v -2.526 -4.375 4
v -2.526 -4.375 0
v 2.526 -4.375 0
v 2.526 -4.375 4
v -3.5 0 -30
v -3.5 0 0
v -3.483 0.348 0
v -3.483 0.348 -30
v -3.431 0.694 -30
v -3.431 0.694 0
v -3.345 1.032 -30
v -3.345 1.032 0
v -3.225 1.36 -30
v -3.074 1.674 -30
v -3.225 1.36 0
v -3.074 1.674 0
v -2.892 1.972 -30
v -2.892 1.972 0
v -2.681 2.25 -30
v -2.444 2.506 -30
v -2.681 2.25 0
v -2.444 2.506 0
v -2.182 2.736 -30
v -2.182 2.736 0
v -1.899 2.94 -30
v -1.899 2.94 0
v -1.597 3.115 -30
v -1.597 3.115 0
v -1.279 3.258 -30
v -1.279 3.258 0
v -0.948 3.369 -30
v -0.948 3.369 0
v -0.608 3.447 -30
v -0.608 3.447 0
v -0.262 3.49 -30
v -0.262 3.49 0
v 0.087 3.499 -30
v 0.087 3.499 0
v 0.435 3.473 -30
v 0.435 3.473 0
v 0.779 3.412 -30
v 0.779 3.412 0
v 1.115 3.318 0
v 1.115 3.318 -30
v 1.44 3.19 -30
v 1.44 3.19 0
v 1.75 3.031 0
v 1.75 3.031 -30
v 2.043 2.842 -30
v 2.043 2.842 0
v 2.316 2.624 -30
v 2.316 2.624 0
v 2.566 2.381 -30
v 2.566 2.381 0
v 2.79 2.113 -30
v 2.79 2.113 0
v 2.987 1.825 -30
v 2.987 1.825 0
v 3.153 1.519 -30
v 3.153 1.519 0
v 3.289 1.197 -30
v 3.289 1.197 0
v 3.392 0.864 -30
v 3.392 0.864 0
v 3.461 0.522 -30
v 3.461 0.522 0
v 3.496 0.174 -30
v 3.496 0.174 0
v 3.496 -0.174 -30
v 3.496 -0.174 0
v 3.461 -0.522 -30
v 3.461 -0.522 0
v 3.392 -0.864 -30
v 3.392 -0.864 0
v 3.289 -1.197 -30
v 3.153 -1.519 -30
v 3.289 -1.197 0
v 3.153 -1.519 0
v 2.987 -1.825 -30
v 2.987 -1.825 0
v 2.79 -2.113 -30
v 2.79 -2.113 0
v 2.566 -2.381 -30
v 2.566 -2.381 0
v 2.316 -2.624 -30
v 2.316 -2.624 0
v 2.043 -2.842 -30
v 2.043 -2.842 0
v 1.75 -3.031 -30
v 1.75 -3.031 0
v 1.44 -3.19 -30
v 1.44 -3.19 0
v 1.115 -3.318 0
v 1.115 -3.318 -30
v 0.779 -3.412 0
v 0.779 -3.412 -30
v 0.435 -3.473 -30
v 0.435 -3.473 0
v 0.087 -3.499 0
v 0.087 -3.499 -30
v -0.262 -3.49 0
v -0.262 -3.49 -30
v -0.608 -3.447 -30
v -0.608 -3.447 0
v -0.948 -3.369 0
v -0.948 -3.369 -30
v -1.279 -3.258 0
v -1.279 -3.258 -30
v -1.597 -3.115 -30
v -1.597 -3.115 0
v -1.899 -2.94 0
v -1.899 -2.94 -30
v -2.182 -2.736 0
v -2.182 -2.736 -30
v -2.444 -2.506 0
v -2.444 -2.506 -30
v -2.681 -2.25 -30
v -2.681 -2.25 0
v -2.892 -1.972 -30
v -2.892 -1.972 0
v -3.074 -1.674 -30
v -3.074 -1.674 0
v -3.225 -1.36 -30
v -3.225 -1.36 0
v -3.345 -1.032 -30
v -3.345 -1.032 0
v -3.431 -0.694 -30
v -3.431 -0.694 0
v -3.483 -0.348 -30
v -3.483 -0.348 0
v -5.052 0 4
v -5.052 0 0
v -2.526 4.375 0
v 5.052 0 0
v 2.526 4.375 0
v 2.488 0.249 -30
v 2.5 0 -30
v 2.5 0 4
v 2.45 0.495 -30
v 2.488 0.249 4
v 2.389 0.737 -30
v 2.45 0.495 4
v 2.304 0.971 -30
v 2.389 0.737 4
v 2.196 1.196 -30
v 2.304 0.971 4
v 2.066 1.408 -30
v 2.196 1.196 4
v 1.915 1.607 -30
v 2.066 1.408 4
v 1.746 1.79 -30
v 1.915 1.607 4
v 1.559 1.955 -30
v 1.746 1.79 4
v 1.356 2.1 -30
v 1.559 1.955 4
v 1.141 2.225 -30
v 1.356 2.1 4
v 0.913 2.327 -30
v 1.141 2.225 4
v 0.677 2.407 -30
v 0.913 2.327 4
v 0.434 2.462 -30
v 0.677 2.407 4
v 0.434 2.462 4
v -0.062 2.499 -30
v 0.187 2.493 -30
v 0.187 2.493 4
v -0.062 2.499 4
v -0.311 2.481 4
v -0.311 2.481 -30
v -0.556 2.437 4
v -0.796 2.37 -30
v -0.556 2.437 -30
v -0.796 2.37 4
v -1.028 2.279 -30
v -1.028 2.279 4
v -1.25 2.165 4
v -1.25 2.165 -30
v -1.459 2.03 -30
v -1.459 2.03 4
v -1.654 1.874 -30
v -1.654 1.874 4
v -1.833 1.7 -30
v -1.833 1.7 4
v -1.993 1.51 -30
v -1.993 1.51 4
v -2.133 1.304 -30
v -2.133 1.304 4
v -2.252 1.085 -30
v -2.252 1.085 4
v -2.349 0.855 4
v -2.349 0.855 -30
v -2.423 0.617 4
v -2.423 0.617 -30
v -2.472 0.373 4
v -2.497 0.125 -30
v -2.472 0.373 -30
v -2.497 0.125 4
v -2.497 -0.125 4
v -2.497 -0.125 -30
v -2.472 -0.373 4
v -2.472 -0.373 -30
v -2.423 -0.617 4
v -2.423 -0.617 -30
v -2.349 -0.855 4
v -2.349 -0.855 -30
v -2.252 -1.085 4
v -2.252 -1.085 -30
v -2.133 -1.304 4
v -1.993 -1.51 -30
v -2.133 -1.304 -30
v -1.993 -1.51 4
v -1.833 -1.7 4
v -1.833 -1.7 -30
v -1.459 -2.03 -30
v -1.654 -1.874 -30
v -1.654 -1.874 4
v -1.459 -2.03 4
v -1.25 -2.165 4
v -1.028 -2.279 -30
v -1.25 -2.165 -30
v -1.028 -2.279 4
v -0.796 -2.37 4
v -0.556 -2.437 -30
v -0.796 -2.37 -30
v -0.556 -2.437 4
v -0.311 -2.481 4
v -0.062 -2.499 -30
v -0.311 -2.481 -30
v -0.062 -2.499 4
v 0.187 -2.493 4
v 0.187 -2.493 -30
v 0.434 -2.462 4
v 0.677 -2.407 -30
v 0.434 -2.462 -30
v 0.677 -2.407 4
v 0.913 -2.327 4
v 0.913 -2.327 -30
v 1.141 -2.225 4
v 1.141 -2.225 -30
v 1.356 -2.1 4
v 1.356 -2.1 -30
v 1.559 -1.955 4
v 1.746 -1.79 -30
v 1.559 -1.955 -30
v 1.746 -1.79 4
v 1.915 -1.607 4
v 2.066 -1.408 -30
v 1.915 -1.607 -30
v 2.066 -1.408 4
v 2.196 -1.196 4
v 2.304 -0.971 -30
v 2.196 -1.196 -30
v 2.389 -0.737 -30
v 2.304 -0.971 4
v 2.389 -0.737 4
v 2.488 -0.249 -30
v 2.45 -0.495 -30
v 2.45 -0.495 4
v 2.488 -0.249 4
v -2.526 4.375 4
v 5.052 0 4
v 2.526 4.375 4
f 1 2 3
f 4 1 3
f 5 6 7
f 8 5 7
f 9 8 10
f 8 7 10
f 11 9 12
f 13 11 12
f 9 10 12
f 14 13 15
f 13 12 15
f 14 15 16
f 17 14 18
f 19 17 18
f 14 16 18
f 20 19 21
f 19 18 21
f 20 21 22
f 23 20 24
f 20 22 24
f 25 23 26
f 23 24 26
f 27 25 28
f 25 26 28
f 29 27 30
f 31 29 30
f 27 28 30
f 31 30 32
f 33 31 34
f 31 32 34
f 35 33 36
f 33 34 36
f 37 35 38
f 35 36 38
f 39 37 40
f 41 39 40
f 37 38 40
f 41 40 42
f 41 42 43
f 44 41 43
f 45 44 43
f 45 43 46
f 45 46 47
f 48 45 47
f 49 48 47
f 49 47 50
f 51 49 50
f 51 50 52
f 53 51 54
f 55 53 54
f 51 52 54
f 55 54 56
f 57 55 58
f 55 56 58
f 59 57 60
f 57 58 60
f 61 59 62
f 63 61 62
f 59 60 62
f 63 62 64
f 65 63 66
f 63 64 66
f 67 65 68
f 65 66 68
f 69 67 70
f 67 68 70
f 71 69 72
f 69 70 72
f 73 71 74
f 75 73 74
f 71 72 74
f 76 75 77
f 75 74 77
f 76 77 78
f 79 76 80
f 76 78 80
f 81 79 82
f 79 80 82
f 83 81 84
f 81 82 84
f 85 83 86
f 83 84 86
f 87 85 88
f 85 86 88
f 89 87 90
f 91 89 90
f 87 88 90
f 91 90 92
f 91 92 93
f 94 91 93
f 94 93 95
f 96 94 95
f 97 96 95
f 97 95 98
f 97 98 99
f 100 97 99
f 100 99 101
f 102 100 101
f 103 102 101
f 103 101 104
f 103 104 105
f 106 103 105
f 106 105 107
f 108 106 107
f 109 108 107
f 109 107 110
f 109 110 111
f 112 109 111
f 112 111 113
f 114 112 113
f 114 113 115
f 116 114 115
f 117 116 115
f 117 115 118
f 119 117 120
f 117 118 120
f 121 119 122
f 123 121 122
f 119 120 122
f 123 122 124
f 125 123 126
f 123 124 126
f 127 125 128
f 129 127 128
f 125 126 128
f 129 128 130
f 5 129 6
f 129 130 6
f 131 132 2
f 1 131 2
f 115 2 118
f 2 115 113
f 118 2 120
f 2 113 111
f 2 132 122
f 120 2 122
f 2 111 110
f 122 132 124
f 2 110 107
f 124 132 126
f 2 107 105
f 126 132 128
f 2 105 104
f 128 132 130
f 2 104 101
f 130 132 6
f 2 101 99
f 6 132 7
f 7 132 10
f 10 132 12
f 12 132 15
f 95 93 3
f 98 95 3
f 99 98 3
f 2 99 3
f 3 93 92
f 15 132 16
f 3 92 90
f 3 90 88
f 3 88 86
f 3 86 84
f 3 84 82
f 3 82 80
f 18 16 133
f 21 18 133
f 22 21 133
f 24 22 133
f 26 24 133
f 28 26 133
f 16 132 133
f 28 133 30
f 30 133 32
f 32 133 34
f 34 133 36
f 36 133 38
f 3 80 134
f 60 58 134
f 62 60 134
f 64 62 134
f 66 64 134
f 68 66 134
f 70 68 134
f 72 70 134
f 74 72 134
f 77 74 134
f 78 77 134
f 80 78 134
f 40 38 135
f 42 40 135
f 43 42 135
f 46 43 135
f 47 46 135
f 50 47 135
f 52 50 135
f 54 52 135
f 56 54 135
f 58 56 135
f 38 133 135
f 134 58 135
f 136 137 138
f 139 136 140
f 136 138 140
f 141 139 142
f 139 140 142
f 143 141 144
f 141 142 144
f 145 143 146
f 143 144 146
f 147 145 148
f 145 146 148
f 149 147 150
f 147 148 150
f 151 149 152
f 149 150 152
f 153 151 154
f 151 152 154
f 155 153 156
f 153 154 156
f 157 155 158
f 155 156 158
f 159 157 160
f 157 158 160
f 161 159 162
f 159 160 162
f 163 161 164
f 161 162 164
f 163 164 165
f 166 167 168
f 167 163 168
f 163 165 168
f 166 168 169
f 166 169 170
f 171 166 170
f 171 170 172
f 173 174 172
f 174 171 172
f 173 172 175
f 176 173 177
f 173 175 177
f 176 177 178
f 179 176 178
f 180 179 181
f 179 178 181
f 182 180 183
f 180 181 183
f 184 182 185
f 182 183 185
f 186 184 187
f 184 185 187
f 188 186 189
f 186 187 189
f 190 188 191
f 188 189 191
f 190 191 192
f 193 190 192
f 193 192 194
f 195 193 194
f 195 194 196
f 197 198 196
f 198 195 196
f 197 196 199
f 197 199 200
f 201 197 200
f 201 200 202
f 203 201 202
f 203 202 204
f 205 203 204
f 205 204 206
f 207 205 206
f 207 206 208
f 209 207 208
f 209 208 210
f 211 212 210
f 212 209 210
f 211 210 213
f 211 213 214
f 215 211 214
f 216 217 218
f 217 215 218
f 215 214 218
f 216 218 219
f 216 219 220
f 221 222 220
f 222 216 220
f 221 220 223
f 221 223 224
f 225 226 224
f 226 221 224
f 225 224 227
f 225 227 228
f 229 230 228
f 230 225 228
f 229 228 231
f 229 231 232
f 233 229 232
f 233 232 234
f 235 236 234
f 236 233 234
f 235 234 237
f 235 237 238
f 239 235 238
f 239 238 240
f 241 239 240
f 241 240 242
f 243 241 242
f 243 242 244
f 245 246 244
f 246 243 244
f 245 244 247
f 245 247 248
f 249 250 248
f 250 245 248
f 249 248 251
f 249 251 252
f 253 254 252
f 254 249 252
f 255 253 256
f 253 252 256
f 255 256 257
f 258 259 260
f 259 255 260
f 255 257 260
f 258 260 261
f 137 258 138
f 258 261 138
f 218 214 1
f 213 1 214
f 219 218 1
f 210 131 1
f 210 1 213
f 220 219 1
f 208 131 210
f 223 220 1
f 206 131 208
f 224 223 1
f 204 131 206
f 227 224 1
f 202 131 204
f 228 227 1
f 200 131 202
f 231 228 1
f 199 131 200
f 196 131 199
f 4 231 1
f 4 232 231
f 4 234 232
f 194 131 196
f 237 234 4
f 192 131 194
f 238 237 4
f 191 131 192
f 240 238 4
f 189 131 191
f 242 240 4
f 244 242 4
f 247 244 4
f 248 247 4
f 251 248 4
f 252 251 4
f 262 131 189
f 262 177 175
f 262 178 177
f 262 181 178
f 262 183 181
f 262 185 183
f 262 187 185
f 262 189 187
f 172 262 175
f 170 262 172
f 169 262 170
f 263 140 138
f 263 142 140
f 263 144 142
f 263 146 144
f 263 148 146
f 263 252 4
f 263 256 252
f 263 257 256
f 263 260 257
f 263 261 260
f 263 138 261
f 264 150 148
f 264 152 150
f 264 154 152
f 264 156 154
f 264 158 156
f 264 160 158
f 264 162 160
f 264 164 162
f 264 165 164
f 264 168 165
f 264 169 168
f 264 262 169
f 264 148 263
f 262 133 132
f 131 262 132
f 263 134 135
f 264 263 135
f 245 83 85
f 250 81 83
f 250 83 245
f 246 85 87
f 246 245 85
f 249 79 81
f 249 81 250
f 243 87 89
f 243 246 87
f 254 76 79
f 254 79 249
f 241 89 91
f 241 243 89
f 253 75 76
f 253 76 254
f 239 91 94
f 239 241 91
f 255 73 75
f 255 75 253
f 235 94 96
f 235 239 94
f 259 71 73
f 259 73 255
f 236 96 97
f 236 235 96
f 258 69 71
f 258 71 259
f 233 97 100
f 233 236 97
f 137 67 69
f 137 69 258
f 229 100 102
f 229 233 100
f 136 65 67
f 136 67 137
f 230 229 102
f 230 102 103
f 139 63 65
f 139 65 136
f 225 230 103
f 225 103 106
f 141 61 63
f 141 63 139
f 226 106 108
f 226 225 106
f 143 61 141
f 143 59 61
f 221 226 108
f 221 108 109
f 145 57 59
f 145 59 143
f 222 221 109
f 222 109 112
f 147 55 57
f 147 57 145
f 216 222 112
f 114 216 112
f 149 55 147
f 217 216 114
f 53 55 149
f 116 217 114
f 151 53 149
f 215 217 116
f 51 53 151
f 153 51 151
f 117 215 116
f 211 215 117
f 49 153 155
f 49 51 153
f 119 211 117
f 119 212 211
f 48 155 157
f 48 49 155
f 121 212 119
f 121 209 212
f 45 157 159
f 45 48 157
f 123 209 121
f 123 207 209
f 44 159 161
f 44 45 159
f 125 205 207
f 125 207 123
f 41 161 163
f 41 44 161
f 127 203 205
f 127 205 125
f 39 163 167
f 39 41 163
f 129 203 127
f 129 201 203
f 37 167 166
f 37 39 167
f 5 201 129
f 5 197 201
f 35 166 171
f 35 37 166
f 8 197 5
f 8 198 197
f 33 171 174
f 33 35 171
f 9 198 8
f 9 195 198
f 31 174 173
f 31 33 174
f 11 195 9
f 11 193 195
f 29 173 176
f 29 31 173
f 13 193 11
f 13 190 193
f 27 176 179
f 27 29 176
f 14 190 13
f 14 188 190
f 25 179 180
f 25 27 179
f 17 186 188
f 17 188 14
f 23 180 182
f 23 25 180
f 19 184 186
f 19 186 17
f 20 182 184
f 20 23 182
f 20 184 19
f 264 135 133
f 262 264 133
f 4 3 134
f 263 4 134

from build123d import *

# Parameters (mm, degrees)
EXTRUDE_1_DEPTH     = 4
SKETCH_2_R          = 3.5
SKETCH_2_R_2        = 2.5
EXTRUDE_2_DEPTH     = 30
SKETCH_3_R          = 2.5
CUT_EXTRUDE_1_DEPTH = 64


with BuildPart() as part:
    # 草图1 → 凸台-拉伸1 (new body)
    with BuildSketch(Plane.XY):
        Polygon((5.051814855, 0), (2.525907428, 4.375), (-2.525907428, 4.375), (-5.051814855, 0), (-2.525907428, -4.375), (2.525907428, -4.375), align=None)
    extrude(amount=EXTRUDE_1_DEPTH)

    # 草图2 → 凸台-拉伸2 (add)
    with BuildSketch(Plane(origin=(0, 0, 0), x_dir=(-1, 0, 0), z_dir=(0, 0, -1))):
        Circle(SKETCH_2_R)
        Circle(SKETCH_2_R_2, mode=Mode.SUBTRACT)
    extrude(amount=EXTRUDE_2_DEPTH)

    # 草图3 → 切除-拉伸1 (cut)
    with BuildSketch(Plane.XY.offset(4)):
        Circle(SKETCH_3_R)
    extrude(amount=-CUT_EXTRUDE_1_DEPTH, mode=Mode.SUBTRACT)


solid = part.part
